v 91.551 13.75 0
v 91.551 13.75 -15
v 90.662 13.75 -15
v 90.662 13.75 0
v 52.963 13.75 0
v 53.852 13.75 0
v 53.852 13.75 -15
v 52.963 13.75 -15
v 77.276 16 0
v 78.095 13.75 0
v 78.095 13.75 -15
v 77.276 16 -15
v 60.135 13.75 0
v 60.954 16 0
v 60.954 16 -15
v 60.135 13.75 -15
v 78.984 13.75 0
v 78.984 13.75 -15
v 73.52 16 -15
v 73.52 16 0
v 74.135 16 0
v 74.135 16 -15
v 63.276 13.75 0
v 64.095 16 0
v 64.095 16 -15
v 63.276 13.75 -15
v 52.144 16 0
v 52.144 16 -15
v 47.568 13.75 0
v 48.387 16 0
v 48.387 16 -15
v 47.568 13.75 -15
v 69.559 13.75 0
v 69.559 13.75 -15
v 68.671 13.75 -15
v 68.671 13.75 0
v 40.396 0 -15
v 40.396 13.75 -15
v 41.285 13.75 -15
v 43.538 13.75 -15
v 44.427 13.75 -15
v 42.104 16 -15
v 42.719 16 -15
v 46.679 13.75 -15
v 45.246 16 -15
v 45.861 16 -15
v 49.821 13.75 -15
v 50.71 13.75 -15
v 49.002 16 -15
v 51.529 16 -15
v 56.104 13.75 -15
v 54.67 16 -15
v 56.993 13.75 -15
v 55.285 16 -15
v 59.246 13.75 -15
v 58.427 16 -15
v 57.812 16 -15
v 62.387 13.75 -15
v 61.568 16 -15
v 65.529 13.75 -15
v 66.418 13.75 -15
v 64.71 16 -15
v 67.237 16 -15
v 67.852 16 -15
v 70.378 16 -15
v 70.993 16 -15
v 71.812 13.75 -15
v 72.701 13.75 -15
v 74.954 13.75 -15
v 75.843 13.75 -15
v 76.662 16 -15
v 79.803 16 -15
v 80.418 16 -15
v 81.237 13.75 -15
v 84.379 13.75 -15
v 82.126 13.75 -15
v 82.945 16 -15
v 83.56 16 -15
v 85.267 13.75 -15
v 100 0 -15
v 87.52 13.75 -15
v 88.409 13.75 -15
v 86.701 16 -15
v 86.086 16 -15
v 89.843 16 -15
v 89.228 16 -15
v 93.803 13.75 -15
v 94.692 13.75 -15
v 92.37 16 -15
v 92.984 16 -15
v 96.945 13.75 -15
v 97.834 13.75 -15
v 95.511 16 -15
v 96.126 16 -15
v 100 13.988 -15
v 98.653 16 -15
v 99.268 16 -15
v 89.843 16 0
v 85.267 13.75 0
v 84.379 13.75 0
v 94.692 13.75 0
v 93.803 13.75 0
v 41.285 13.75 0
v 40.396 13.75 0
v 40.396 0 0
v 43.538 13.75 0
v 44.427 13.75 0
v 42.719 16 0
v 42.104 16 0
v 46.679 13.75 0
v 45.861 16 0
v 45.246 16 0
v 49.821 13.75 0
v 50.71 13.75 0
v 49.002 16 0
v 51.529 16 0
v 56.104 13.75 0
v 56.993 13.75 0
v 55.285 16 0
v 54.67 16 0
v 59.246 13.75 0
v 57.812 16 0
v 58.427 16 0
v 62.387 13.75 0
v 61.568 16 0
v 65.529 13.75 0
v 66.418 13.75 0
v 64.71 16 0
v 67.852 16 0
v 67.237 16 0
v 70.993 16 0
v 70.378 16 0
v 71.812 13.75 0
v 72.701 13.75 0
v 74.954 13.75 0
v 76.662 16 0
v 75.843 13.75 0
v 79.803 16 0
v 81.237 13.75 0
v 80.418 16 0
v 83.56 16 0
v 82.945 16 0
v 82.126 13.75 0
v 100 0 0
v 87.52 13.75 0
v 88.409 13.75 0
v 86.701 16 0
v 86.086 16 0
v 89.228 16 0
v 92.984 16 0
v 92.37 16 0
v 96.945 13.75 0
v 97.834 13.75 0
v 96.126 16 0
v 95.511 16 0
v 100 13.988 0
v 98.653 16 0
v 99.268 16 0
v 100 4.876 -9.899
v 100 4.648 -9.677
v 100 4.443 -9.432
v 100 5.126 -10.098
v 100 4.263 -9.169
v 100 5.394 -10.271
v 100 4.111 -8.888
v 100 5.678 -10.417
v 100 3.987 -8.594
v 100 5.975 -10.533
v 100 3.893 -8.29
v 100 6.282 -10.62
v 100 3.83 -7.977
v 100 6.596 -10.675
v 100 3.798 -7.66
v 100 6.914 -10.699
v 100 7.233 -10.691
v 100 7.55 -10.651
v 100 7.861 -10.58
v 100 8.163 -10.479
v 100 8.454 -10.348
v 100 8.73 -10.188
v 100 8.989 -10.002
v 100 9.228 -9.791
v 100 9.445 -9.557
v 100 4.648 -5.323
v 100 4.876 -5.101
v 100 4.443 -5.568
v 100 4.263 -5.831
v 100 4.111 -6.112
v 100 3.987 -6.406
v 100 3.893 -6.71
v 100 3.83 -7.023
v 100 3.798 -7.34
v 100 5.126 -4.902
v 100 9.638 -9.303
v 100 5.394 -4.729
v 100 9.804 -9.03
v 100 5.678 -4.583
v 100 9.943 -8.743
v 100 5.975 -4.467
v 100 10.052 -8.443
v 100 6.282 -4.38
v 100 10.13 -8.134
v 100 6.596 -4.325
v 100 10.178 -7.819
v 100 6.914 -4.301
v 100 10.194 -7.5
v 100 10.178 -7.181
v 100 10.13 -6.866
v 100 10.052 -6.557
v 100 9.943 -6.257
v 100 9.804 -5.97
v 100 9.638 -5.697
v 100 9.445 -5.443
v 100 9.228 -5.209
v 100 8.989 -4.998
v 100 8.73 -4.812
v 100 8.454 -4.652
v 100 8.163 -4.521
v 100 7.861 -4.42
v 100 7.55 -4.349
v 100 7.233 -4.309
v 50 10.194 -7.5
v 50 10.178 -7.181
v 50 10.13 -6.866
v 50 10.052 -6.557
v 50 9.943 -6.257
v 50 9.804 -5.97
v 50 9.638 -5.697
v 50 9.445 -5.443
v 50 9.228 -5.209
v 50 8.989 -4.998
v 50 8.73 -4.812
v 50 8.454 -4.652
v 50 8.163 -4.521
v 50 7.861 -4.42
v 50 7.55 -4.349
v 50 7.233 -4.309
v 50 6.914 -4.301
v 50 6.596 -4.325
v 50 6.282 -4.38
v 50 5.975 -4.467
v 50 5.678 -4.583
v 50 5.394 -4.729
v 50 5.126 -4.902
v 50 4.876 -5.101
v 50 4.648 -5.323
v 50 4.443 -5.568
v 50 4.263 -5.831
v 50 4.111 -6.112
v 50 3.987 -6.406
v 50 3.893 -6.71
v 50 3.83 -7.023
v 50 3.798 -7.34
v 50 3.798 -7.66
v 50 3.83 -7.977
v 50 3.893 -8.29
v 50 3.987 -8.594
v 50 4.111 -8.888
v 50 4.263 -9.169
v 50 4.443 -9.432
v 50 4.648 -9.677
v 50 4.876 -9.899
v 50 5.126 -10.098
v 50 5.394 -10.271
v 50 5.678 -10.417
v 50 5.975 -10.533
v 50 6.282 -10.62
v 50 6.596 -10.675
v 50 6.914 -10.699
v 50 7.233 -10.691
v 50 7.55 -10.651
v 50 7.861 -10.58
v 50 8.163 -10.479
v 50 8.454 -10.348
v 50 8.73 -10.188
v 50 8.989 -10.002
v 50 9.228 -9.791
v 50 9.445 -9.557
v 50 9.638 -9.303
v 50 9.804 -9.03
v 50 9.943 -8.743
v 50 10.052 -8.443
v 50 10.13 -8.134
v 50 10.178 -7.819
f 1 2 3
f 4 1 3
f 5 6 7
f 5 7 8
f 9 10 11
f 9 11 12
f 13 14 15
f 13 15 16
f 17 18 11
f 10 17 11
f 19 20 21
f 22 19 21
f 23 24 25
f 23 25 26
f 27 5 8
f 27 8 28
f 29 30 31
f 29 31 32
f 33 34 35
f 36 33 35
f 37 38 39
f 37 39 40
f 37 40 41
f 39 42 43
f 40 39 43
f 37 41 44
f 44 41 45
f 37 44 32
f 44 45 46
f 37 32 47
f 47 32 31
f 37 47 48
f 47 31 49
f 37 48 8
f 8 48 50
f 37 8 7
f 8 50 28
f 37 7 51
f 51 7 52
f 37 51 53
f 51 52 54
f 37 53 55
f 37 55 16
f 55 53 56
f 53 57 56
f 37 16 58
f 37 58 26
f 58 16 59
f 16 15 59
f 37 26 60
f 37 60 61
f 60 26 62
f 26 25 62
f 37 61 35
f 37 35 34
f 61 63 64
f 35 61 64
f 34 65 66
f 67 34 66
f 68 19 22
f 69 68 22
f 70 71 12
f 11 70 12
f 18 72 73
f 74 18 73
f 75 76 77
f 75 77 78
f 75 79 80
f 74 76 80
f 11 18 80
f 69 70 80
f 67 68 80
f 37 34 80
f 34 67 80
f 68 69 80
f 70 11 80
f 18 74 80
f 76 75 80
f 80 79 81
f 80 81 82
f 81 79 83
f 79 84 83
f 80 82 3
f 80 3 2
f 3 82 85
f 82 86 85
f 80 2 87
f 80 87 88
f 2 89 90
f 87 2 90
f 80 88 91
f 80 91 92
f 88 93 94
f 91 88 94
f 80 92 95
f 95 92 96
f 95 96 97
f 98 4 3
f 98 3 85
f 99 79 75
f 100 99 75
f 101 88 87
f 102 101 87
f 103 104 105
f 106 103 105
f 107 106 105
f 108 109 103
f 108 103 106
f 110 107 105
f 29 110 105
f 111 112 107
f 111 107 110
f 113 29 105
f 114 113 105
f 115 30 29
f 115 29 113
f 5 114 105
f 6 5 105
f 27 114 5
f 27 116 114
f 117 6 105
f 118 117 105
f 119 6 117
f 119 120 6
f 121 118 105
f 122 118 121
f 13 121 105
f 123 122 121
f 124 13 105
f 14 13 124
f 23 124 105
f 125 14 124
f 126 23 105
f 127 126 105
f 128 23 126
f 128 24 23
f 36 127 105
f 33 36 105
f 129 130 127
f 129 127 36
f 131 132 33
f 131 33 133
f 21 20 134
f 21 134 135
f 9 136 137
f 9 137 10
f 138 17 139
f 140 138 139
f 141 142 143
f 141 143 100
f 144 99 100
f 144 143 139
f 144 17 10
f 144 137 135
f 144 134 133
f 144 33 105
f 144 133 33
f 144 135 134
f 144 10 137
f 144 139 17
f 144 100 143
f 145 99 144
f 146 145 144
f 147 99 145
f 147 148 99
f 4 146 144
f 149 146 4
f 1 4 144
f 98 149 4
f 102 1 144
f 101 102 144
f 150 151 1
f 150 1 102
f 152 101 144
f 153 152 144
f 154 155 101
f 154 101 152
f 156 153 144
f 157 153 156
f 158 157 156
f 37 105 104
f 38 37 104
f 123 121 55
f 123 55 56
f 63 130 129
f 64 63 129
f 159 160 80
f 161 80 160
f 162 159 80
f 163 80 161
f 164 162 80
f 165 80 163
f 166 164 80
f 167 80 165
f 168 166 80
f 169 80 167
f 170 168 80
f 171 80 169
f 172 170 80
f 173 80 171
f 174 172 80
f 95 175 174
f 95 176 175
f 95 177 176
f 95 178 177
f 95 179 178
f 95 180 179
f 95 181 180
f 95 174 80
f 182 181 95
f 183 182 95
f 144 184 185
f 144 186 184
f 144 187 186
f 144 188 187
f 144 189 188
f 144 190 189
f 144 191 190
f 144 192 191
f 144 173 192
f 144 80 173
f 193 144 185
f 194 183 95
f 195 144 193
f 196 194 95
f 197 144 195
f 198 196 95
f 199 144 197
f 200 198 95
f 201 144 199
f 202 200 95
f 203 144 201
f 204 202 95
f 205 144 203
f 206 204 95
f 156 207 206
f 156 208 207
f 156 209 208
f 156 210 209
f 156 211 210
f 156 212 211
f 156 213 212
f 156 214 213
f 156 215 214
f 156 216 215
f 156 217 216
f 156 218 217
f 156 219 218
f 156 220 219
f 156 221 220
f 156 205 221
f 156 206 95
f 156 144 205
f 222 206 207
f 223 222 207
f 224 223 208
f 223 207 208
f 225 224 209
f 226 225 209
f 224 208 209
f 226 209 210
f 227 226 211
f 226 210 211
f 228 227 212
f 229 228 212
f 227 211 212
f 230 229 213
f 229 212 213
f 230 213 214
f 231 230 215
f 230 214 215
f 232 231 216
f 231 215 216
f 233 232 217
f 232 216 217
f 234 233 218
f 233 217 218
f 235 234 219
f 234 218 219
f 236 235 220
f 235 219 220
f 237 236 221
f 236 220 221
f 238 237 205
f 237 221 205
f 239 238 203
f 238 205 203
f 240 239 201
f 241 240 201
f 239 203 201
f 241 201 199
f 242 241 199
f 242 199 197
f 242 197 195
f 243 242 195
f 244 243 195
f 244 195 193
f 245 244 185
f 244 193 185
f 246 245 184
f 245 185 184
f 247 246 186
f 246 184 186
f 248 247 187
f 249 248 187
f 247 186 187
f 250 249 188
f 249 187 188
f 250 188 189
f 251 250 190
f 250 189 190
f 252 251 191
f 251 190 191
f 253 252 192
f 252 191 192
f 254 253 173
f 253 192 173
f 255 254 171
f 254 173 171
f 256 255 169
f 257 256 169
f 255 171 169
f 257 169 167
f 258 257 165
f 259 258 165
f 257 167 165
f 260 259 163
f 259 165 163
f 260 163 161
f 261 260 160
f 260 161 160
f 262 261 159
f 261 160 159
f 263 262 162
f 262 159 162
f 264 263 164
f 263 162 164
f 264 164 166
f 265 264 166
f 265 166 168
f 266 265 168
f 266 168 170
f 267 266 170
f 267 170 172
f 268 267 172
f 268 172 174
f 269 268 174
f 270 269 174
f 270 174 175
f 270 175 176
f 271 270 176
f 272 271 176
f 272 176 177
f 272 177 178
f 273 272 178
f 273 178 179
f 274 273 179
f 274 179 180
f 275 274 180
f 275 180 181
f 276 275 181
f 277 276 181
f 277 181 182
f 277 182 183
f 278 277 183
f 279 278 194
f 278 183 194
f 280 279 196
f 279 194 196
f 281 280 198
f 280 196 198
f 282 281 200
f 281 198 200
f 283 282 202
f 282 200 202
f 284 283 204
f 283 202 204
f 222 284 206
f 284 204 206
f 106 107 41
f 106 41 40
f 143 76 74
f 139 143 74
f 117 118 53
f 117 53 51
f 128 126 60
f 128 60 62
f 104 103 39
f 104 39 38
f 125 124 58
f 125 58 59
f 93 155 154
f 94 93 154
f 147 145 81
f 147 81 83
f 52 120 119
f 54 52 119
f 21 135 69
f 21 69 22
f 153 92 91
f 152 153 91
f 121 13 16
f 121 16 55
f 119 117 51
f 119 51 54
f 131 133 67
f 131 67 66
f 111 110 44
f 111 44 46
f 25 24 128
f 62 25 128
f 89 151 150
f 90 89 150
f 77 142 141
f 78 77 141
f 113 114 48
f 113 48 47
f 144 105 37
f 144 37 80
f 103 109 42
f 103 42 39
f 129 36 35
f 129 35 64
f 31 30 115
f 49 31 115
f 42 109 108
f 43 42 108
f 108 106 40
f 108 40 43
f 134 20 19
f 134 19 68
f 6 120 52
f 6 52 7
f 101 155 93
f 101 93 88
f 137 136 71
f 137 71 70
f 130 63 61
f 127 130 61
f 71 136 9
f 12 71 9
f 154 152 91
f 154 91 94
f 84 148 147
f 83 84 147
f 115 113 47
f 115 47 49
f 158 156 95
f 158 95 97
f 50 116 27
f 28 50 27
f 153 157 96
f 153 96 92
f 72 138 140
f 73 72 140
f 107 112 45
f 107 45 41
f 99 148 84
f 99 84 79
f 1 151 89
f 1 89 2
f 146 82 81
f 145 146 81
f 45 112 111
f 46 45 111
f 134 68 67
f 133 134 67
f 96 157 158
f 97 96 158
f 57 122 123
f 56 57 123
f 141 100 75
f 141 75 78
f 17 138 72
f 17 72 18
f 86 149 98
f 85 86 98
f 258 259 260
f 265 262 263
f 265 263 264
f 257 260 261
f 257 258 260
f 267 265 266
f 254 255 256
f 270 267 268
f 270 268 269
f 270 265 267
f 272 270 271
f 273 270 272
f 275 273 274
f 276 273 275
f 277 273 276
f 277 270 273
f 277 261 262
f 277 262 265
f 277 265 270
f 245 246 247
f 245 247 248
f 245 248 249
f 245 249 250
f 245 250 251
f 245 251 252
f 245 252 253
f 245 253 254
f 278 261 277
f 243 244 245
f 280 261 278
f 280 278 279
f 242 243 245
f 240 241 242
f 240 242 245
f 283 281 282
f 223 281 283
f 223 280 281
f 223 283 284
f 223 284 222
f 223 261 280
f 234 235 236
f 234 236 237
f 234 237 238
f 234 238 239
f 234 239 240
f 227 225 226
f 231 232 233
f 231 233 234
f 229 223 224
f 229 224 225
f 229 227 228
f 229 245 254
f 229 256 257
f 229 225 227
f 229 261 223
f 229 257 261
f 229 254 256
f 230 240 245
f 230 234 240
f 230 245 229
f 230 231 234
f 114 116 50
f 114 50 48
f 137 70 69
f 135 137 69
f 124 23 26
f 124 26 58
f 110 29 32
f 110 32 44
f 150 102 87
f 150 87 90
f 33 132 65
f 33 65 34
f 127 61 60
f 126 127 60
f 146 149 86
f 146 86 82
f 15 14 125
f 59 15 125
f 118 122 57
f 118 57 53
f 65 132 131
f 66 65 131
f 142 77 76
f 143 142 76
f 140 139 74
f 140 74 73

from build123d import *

# Parameters (mm, degrees)
BLANKSKE_W         = 100
BLANKSKE_H         = 16
BLANK_DEPTH        = 15
TOOTHCUTSIM_DEPTH  = 103.376755174
TEETHCUTS_COUNT    = 33
TEETHCUTS_PITCH    = 3.14159265
SKETCH1_R          = 3.2
CUT_EXTRUDE1_DEPTH = 50
SKETCH2_W          = 40.39626908
SKETCH2_H          = 26.250089156
CUT_EXTRUDE2_DEPTH = 103.376755174


with BuildPart() as part:
    # BlankSke → Blank (new body)
    with BuildSketch(Plane.XY):
        with Locations((50, 8)):
            Rectangle(BLANKSKE_W, BLANKSKE_H)
    extrude(amount=-BLANK_DEPTH)

    # TooCutSkeSim → ToothCutSim (cut, through all)
    with BuildSketch(Plane.XY):
        Polygon((0.44443537, 13.75), (-0.44443537, 13.75), (-1.272613241, 16.0254), (1.272613241, 16.0254), align=None)
    toothcutsim = extrude(amount=-TOOTHCUTSIM_DEPTH, mode=Mode.SUBTRACT)

    # TeethCuts: ToothCutSim ×33
    with Locations(*[(i * TEETHCUTS_PITCH, 0, 0) for i in range(1, TEETHCUTS_COUNT)]):
        add(toothcutsim, mode=Mode.SUBTRACT)

    # Sketch1 → Cut-Extrude1 (cut)
    with BuildSketch(Plane(origin=(100, 0, 0), x_dir=(0, 0, -1), z_dir=(1, 0, 0))):
        with Locations((7.5, 6.993868828)):
            Circle(SKETCH1_R)
    extrude(amount=-CUT_EXTRUDE1_DEPTH, mode=Mode.SUBTRACT)

    # Sketch2 → Cut-Extrude2 (cut, through all)
    with BuildSketch(Plane.XY):
        with Locations((20.19813454, 13.125044578)):
            Rectangle(SKETCH2_W, SKETCH2_H)
    extrude(amount=-CUT_EXTRUDE2_DEPTH, mode=Mode.SUBTRACT)


solid = part.part
